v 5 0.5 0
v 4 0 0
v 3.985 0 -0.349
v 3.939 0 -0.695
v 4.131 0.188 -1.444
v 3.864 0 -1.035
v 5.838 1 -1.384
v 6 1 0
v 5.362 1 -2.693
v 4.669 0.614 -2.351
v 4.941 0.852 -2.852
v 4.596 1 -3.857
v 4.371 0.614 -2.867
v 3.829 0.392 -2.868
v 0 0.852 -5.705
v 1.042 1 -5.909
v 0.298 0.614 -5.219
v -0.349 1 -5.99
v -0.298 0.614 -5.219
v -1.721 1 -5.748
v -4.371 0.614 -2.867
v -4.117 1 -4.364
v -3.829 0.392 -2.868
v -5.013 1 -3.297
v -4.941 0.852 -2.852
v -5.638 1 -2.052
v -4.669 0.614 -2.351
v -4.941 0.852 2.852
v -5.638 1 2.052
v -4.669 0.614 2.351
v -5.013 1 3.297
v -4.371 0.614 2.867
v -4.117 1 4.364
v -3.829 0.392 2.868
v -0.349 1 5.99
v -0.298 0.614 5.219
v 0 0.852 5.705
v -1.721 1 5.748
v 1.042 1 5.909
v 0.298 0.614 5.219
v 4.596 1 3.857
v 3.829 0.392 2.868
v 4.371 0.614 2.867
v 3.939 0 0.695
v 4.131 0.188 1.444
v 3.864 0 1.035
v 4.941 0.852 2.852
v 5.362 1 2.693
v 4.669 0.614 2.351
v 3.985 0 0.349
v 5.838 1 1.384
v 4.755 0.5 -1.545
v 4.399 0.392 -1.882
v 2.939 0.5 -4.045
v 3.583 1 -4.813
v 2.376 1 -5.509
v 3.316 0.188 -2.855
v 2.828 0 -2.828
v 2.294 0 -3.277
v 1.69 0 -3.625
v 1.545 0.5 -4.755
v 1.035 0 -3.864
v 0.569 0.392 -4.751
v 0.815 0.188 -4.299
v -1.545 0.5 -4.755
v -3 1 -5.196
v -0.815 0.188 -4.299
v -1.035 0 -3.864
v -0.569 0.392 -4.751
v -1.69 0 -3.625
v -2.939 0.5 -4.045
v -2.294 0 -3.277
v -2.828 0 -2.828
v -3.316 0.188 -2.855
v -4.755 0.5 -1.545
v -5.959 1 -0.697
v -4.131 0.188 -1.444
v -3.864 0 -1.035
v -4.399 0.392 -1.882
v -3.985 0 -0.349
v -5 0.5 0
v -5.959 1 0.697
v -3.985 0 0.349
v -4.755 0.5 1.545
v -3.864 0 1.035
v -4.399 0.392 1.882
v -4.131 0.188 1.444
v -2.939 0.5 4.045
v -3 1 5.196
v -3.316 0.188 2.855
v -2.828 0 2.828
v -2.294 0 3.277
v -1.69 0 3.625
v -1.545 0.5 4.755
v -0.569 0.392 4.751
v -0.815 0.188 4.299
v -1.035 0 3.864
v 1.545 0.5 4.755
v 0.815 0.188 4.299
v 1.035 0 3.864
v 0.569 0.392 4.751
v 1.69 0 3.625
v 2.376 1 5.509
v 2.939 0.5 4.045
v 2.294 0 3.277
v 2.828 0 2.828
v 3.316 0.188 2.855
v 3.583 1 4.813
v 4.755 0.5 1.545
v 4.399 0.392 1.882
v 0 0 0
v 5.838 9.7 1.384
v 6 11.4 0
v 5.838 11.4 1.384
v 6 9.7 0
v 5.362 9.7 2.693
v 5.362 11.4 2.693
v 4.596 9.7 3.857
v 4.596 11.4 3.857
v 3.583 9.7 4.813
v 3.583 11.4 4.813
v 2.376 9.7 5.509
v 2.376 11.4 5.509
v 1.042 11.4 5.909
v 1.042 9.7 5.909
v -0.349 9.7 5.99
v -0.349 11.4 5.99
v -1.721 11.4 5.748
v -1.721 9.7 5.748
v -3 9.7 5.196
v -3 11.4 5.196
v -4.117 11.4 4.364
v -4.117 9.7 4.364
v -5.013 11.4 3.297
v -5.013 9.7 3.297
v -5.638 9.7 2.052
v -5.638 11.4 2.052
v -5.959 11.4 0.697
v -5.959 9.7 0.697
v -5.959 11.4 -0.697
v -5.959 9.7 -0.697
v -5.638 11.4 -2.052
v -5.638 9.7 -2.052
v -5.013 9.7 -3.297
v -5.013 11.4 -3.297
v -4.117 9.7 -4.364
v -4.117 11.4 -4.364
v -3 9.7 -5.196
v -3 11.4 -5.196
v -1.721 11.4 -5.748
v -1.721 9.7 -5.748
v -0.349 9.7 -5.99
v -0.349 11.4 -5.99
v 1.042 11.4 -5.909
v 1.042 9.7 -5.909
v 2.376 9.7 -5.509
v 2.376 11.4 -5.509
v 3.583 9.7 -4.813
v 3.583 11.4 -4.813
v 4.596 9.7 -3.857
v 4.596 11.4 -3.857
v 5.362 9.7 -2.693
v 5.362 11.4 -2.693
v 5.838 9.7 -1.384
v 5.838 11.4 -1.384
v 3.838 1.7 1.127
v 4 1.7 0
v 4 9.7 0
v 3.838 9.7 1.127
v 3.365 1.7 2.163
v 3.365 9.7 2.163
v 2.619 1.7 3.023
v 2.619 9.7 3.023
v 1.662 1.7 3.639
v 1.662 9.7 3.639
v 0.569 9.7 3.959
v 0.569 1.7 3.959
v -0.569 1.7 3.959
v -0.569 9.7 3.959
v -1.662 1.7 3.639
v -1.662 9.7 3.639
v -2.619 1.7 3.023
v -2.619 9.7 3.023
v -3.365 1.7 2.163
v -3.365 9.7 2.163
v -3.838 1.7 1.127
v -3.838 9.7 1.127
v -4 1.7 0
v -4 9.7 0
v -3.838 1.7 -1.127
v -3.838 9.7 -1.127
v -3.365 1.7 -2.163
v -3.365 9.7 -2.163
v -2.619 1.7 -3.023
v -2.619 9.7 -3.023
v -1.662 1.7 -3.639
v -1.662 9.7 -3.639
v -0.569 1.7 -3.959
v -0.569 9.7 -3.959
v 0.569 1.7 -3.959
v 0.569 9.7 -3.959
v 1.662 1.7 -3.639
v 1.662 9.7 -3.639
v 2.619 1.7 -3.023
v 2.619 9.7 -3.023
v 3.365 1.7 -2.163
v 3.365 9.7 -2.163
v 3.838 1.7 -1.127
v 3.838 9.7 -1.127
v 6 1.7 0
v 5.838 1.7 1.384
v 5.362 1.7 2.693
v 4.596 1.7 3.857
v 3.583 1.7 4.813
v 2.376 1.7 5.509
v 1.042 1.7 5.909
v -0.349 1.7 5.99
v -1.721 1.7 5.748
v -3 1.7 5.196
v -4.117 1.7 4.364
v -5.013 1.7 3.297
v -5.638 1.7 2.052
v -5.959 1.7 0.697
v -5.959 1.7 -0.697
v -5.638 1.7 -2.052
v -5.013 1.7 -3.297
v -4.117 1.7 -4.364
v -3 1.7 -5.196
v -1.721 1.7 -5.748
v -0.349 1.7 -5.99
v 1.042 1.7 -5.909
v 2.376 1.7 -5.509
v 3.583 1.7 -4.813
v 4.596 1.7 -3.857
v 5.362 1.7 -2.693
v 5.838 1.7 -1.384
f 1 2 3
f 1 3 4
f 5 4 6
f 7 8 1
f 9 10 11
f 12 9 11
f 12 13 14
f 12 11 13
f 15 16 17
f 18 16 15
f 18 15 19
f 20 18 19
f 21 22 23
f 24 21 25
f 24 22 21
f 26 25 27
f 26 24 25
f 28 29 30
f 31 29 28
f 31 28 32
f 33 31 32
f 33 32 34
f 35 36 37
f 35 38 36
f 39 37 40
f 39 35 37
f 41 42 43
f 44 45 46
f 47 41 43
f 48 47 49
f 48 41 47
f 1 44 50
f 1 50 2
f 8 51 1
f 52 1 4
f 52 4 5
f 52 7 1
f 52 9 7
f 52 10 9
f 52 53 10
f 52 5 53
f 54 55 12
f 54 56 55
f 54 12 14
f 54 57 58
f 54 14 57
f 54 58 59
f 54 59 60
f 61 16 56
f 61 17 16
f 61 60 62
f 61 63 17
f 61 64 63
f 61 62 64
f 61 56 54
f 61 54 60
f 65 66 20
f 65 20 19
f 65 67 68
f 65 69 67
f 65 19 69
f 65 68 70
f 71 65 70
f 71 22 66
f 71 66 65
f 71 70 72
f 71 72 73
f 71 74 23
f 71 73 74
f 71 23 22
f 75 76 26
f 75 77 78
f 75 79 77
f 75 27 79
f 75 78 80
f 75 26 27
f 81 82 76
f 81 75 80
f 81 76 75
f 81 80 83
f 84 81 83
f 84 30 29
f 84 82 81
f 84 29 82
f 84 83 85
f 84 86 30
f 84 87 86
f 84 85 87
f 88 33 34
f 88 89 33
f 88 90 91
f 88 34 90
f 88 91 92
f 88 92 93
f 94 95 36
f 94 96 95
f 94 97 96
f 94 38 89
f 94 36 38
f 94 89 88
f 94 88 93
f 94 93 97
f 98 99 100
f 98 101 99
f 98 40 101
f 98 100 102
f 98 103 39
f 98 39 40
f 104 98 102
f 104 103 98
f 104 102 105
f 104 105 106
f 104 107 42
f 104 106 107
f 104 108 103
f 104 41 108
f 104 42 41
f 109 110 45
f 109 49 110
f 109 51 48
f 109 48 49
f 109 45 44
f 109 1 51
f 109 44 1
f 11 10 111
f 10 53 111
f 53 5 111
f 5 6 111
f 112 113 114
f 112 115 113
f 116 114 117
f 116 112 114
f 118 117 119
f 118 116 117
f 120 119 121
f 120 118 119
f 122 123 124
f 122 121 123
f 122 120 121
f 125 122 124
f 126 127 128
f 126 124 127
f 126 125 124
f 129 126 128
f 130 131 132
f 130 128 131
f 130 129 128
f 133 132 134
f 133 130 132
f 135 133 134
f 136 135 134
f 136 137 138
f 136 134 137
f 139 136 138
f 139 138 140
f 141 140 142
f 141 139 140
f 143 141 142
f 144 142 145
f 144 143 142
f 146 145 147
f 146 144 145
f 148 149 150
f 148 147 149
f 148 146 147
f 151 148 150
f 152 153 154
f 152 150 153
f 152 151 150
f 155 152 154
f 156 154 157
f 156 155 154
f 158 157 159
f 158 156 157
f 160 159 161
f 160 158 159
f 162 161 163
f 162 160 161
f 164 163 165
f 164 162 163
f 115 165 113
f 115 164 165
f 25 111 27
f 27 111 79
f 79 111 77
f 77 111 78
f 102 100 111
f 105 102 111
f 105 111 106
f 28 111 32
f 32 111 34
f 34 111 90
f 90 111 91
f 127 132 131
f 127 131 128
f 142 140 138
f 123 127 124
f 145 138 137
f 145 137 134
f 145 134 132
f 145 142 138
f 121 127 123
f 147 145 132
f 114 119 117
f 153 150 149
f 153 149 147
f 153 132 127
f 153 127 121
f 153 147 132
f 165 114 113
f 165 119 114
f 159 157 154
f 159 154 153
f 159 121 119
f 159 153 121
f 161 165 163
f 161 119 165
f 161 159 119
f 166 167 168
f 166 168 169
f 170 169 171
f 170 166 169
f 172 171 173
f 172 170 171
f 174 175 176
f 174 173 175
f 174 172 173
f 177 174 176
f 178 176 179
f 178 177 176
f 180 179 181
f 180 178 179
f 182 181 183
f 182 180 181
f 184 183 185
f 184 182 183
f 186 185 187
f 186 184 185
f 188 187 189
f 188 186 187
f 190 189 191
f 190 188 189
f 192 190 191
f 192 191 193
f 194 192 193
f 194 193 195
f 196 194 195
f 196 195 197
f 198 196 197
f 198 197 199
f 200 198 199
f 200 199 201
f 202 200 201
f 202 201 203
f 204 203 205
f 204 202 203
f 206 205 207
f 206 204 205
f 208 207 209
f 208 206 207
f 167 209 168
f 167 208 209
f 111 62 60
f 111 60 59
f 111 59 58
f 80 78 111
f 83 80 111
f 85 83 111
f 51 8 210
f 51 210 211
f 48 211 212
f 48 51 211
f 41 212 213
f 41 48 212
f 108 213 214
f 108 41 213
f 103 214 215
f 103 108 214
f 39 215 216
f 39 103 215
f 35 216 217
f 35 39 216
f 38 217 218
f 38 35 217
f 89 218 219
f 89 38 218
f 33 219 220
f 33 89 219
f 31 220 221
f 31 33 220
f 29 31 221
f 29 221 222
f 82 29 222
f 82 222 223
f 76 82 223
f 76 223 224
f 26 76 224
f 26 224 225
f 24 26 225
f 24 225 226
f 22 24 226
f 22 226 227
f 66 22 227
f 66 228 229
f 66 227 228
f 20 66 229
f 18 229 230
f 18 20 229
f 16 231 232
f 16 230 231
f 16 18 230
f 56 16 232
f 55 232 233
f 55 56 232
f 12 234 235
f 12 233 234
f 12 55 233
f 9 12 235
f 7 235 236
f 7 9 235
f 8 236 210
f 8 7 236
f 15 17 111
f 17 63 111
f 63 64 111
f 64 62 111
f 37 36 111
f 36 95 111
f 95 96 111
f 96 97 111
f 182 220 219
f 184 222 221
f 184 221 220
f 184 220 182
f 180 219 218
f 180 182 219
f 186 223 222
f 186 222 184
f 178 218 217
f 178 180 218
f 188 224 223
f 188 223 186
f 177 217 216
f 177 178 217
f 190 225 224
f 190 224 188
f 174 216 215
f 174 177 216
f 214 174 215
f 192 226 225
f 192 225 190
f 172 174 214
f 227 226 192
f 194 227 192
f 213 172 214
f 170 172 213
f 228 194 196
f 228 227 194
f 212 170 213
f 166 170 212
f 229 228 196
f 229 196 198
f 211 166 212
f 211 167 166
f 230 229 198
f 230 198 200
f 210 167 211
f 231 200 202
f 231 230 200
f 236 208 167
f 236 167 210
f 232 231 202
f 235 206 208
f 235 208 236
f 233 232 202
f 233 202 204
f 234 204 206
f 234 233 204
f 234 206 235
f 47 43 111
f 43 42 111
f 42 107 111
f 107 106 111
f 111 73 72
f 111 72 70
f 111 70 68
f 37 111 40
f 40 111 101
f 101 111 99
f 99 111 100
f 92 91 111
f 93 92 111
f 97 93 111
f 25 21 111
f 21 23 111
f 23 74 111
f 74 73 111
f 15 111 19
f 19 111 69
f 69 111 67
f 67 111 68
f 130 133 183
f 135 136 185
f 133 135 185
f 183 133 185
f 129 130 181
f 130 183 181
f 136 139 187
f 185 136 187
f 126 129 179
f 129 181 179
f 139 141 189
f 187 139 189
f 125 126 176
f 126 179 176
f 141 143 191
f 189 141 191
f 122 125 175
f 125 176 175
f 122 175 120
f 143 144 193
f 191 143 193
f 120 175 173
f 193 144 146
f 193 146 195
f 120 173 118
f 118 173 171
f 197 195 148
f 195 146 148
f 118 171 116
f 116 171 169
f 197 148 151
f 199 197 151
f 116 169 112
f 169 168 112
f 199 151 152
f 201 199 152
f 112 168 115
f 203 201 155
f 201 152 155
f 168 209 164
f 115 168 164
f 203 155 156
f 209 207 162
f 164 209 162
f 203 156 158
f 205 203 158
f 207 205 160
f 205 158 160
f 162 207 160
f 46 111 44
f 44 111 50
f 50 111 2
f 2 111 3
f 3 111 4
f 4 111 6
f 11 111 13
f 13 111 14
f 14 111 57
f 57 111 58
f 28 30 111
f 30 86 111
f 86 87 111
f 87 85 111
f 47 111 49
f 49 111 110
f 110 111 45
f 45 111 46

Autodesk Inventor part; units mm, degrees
ref_plane "YZ Plane" through (0, 0, 0) normal (1, 0, 0) x (0, 1, 0)
ref_plane "XZ Plane" through (0, 0, 0) normal (0, 1, 0) x (-1, 0, 0)
ref_plane "XY Plane" through (0, 0, 0) normal (0, 0, 1) x (1, 0, 0)
sketch "Sketch1" plane through (0, 0, 0) normal (0, 0, 1) x (1, 0, 0)
  line L0 (0, 0) -> (0, 11.4)
  line L1 (0, 11.4) -> (6, 11.4)
  line L2 (6, 11.4) -> (6, 9.7)
  line L3 (6, 9.7) -> (4, 9.7)
  line L4 (4, 9.7) -> (4, 1.7)
  line L5 (4, 1.7) -> (6, 1.7)
  line L6 (6, 1.7) -> (6, 1)
  line L7 (4, 0) -> (0, 0)
  line L8 (6, 1) -> (4, 0)
  point P0 (6, 0)
  dimension "d0" = 8
  dimension "d1" = 6
  dimension "d2" = 4
  dimension "d3" = 1.7
  dimension "d5" = 1.7
  dimension "d6" = 1
  dimension "d7" = 2
revolve "Revolution1" add sketch "Sketch1" angle 360 about axis through (0, 0, 0) along (0, 1, 0)
sketch "Sketch2" plane through (0, 0, 0) normal (0, -1, 0) x (1, 0, 0)
  line L0 (0, 0) -> (3.4395, 12.8364)
  line L1 (3.4395, 12.8364) -> (-3.4395, 12.8364)
  line L2 (-3.4395, 12.8364) -> (0, 0)
  line L3 (0, 0) -> (0, -2.5884)
  dimension "d8" = 30
extrude "Extrusion1" cut sketch "Sketch2" against normal blind 1.2 draft -60
pattern_circular "Circular Pattern1" count 6 over 360 about axis through (0, -10, 0) along (0, 1, 0) of "Extrusion1"
equation "\"d2\" = d25"
equation "\"d25\" = 4"
properties part number "Wheel 75 mm - Part 5"
